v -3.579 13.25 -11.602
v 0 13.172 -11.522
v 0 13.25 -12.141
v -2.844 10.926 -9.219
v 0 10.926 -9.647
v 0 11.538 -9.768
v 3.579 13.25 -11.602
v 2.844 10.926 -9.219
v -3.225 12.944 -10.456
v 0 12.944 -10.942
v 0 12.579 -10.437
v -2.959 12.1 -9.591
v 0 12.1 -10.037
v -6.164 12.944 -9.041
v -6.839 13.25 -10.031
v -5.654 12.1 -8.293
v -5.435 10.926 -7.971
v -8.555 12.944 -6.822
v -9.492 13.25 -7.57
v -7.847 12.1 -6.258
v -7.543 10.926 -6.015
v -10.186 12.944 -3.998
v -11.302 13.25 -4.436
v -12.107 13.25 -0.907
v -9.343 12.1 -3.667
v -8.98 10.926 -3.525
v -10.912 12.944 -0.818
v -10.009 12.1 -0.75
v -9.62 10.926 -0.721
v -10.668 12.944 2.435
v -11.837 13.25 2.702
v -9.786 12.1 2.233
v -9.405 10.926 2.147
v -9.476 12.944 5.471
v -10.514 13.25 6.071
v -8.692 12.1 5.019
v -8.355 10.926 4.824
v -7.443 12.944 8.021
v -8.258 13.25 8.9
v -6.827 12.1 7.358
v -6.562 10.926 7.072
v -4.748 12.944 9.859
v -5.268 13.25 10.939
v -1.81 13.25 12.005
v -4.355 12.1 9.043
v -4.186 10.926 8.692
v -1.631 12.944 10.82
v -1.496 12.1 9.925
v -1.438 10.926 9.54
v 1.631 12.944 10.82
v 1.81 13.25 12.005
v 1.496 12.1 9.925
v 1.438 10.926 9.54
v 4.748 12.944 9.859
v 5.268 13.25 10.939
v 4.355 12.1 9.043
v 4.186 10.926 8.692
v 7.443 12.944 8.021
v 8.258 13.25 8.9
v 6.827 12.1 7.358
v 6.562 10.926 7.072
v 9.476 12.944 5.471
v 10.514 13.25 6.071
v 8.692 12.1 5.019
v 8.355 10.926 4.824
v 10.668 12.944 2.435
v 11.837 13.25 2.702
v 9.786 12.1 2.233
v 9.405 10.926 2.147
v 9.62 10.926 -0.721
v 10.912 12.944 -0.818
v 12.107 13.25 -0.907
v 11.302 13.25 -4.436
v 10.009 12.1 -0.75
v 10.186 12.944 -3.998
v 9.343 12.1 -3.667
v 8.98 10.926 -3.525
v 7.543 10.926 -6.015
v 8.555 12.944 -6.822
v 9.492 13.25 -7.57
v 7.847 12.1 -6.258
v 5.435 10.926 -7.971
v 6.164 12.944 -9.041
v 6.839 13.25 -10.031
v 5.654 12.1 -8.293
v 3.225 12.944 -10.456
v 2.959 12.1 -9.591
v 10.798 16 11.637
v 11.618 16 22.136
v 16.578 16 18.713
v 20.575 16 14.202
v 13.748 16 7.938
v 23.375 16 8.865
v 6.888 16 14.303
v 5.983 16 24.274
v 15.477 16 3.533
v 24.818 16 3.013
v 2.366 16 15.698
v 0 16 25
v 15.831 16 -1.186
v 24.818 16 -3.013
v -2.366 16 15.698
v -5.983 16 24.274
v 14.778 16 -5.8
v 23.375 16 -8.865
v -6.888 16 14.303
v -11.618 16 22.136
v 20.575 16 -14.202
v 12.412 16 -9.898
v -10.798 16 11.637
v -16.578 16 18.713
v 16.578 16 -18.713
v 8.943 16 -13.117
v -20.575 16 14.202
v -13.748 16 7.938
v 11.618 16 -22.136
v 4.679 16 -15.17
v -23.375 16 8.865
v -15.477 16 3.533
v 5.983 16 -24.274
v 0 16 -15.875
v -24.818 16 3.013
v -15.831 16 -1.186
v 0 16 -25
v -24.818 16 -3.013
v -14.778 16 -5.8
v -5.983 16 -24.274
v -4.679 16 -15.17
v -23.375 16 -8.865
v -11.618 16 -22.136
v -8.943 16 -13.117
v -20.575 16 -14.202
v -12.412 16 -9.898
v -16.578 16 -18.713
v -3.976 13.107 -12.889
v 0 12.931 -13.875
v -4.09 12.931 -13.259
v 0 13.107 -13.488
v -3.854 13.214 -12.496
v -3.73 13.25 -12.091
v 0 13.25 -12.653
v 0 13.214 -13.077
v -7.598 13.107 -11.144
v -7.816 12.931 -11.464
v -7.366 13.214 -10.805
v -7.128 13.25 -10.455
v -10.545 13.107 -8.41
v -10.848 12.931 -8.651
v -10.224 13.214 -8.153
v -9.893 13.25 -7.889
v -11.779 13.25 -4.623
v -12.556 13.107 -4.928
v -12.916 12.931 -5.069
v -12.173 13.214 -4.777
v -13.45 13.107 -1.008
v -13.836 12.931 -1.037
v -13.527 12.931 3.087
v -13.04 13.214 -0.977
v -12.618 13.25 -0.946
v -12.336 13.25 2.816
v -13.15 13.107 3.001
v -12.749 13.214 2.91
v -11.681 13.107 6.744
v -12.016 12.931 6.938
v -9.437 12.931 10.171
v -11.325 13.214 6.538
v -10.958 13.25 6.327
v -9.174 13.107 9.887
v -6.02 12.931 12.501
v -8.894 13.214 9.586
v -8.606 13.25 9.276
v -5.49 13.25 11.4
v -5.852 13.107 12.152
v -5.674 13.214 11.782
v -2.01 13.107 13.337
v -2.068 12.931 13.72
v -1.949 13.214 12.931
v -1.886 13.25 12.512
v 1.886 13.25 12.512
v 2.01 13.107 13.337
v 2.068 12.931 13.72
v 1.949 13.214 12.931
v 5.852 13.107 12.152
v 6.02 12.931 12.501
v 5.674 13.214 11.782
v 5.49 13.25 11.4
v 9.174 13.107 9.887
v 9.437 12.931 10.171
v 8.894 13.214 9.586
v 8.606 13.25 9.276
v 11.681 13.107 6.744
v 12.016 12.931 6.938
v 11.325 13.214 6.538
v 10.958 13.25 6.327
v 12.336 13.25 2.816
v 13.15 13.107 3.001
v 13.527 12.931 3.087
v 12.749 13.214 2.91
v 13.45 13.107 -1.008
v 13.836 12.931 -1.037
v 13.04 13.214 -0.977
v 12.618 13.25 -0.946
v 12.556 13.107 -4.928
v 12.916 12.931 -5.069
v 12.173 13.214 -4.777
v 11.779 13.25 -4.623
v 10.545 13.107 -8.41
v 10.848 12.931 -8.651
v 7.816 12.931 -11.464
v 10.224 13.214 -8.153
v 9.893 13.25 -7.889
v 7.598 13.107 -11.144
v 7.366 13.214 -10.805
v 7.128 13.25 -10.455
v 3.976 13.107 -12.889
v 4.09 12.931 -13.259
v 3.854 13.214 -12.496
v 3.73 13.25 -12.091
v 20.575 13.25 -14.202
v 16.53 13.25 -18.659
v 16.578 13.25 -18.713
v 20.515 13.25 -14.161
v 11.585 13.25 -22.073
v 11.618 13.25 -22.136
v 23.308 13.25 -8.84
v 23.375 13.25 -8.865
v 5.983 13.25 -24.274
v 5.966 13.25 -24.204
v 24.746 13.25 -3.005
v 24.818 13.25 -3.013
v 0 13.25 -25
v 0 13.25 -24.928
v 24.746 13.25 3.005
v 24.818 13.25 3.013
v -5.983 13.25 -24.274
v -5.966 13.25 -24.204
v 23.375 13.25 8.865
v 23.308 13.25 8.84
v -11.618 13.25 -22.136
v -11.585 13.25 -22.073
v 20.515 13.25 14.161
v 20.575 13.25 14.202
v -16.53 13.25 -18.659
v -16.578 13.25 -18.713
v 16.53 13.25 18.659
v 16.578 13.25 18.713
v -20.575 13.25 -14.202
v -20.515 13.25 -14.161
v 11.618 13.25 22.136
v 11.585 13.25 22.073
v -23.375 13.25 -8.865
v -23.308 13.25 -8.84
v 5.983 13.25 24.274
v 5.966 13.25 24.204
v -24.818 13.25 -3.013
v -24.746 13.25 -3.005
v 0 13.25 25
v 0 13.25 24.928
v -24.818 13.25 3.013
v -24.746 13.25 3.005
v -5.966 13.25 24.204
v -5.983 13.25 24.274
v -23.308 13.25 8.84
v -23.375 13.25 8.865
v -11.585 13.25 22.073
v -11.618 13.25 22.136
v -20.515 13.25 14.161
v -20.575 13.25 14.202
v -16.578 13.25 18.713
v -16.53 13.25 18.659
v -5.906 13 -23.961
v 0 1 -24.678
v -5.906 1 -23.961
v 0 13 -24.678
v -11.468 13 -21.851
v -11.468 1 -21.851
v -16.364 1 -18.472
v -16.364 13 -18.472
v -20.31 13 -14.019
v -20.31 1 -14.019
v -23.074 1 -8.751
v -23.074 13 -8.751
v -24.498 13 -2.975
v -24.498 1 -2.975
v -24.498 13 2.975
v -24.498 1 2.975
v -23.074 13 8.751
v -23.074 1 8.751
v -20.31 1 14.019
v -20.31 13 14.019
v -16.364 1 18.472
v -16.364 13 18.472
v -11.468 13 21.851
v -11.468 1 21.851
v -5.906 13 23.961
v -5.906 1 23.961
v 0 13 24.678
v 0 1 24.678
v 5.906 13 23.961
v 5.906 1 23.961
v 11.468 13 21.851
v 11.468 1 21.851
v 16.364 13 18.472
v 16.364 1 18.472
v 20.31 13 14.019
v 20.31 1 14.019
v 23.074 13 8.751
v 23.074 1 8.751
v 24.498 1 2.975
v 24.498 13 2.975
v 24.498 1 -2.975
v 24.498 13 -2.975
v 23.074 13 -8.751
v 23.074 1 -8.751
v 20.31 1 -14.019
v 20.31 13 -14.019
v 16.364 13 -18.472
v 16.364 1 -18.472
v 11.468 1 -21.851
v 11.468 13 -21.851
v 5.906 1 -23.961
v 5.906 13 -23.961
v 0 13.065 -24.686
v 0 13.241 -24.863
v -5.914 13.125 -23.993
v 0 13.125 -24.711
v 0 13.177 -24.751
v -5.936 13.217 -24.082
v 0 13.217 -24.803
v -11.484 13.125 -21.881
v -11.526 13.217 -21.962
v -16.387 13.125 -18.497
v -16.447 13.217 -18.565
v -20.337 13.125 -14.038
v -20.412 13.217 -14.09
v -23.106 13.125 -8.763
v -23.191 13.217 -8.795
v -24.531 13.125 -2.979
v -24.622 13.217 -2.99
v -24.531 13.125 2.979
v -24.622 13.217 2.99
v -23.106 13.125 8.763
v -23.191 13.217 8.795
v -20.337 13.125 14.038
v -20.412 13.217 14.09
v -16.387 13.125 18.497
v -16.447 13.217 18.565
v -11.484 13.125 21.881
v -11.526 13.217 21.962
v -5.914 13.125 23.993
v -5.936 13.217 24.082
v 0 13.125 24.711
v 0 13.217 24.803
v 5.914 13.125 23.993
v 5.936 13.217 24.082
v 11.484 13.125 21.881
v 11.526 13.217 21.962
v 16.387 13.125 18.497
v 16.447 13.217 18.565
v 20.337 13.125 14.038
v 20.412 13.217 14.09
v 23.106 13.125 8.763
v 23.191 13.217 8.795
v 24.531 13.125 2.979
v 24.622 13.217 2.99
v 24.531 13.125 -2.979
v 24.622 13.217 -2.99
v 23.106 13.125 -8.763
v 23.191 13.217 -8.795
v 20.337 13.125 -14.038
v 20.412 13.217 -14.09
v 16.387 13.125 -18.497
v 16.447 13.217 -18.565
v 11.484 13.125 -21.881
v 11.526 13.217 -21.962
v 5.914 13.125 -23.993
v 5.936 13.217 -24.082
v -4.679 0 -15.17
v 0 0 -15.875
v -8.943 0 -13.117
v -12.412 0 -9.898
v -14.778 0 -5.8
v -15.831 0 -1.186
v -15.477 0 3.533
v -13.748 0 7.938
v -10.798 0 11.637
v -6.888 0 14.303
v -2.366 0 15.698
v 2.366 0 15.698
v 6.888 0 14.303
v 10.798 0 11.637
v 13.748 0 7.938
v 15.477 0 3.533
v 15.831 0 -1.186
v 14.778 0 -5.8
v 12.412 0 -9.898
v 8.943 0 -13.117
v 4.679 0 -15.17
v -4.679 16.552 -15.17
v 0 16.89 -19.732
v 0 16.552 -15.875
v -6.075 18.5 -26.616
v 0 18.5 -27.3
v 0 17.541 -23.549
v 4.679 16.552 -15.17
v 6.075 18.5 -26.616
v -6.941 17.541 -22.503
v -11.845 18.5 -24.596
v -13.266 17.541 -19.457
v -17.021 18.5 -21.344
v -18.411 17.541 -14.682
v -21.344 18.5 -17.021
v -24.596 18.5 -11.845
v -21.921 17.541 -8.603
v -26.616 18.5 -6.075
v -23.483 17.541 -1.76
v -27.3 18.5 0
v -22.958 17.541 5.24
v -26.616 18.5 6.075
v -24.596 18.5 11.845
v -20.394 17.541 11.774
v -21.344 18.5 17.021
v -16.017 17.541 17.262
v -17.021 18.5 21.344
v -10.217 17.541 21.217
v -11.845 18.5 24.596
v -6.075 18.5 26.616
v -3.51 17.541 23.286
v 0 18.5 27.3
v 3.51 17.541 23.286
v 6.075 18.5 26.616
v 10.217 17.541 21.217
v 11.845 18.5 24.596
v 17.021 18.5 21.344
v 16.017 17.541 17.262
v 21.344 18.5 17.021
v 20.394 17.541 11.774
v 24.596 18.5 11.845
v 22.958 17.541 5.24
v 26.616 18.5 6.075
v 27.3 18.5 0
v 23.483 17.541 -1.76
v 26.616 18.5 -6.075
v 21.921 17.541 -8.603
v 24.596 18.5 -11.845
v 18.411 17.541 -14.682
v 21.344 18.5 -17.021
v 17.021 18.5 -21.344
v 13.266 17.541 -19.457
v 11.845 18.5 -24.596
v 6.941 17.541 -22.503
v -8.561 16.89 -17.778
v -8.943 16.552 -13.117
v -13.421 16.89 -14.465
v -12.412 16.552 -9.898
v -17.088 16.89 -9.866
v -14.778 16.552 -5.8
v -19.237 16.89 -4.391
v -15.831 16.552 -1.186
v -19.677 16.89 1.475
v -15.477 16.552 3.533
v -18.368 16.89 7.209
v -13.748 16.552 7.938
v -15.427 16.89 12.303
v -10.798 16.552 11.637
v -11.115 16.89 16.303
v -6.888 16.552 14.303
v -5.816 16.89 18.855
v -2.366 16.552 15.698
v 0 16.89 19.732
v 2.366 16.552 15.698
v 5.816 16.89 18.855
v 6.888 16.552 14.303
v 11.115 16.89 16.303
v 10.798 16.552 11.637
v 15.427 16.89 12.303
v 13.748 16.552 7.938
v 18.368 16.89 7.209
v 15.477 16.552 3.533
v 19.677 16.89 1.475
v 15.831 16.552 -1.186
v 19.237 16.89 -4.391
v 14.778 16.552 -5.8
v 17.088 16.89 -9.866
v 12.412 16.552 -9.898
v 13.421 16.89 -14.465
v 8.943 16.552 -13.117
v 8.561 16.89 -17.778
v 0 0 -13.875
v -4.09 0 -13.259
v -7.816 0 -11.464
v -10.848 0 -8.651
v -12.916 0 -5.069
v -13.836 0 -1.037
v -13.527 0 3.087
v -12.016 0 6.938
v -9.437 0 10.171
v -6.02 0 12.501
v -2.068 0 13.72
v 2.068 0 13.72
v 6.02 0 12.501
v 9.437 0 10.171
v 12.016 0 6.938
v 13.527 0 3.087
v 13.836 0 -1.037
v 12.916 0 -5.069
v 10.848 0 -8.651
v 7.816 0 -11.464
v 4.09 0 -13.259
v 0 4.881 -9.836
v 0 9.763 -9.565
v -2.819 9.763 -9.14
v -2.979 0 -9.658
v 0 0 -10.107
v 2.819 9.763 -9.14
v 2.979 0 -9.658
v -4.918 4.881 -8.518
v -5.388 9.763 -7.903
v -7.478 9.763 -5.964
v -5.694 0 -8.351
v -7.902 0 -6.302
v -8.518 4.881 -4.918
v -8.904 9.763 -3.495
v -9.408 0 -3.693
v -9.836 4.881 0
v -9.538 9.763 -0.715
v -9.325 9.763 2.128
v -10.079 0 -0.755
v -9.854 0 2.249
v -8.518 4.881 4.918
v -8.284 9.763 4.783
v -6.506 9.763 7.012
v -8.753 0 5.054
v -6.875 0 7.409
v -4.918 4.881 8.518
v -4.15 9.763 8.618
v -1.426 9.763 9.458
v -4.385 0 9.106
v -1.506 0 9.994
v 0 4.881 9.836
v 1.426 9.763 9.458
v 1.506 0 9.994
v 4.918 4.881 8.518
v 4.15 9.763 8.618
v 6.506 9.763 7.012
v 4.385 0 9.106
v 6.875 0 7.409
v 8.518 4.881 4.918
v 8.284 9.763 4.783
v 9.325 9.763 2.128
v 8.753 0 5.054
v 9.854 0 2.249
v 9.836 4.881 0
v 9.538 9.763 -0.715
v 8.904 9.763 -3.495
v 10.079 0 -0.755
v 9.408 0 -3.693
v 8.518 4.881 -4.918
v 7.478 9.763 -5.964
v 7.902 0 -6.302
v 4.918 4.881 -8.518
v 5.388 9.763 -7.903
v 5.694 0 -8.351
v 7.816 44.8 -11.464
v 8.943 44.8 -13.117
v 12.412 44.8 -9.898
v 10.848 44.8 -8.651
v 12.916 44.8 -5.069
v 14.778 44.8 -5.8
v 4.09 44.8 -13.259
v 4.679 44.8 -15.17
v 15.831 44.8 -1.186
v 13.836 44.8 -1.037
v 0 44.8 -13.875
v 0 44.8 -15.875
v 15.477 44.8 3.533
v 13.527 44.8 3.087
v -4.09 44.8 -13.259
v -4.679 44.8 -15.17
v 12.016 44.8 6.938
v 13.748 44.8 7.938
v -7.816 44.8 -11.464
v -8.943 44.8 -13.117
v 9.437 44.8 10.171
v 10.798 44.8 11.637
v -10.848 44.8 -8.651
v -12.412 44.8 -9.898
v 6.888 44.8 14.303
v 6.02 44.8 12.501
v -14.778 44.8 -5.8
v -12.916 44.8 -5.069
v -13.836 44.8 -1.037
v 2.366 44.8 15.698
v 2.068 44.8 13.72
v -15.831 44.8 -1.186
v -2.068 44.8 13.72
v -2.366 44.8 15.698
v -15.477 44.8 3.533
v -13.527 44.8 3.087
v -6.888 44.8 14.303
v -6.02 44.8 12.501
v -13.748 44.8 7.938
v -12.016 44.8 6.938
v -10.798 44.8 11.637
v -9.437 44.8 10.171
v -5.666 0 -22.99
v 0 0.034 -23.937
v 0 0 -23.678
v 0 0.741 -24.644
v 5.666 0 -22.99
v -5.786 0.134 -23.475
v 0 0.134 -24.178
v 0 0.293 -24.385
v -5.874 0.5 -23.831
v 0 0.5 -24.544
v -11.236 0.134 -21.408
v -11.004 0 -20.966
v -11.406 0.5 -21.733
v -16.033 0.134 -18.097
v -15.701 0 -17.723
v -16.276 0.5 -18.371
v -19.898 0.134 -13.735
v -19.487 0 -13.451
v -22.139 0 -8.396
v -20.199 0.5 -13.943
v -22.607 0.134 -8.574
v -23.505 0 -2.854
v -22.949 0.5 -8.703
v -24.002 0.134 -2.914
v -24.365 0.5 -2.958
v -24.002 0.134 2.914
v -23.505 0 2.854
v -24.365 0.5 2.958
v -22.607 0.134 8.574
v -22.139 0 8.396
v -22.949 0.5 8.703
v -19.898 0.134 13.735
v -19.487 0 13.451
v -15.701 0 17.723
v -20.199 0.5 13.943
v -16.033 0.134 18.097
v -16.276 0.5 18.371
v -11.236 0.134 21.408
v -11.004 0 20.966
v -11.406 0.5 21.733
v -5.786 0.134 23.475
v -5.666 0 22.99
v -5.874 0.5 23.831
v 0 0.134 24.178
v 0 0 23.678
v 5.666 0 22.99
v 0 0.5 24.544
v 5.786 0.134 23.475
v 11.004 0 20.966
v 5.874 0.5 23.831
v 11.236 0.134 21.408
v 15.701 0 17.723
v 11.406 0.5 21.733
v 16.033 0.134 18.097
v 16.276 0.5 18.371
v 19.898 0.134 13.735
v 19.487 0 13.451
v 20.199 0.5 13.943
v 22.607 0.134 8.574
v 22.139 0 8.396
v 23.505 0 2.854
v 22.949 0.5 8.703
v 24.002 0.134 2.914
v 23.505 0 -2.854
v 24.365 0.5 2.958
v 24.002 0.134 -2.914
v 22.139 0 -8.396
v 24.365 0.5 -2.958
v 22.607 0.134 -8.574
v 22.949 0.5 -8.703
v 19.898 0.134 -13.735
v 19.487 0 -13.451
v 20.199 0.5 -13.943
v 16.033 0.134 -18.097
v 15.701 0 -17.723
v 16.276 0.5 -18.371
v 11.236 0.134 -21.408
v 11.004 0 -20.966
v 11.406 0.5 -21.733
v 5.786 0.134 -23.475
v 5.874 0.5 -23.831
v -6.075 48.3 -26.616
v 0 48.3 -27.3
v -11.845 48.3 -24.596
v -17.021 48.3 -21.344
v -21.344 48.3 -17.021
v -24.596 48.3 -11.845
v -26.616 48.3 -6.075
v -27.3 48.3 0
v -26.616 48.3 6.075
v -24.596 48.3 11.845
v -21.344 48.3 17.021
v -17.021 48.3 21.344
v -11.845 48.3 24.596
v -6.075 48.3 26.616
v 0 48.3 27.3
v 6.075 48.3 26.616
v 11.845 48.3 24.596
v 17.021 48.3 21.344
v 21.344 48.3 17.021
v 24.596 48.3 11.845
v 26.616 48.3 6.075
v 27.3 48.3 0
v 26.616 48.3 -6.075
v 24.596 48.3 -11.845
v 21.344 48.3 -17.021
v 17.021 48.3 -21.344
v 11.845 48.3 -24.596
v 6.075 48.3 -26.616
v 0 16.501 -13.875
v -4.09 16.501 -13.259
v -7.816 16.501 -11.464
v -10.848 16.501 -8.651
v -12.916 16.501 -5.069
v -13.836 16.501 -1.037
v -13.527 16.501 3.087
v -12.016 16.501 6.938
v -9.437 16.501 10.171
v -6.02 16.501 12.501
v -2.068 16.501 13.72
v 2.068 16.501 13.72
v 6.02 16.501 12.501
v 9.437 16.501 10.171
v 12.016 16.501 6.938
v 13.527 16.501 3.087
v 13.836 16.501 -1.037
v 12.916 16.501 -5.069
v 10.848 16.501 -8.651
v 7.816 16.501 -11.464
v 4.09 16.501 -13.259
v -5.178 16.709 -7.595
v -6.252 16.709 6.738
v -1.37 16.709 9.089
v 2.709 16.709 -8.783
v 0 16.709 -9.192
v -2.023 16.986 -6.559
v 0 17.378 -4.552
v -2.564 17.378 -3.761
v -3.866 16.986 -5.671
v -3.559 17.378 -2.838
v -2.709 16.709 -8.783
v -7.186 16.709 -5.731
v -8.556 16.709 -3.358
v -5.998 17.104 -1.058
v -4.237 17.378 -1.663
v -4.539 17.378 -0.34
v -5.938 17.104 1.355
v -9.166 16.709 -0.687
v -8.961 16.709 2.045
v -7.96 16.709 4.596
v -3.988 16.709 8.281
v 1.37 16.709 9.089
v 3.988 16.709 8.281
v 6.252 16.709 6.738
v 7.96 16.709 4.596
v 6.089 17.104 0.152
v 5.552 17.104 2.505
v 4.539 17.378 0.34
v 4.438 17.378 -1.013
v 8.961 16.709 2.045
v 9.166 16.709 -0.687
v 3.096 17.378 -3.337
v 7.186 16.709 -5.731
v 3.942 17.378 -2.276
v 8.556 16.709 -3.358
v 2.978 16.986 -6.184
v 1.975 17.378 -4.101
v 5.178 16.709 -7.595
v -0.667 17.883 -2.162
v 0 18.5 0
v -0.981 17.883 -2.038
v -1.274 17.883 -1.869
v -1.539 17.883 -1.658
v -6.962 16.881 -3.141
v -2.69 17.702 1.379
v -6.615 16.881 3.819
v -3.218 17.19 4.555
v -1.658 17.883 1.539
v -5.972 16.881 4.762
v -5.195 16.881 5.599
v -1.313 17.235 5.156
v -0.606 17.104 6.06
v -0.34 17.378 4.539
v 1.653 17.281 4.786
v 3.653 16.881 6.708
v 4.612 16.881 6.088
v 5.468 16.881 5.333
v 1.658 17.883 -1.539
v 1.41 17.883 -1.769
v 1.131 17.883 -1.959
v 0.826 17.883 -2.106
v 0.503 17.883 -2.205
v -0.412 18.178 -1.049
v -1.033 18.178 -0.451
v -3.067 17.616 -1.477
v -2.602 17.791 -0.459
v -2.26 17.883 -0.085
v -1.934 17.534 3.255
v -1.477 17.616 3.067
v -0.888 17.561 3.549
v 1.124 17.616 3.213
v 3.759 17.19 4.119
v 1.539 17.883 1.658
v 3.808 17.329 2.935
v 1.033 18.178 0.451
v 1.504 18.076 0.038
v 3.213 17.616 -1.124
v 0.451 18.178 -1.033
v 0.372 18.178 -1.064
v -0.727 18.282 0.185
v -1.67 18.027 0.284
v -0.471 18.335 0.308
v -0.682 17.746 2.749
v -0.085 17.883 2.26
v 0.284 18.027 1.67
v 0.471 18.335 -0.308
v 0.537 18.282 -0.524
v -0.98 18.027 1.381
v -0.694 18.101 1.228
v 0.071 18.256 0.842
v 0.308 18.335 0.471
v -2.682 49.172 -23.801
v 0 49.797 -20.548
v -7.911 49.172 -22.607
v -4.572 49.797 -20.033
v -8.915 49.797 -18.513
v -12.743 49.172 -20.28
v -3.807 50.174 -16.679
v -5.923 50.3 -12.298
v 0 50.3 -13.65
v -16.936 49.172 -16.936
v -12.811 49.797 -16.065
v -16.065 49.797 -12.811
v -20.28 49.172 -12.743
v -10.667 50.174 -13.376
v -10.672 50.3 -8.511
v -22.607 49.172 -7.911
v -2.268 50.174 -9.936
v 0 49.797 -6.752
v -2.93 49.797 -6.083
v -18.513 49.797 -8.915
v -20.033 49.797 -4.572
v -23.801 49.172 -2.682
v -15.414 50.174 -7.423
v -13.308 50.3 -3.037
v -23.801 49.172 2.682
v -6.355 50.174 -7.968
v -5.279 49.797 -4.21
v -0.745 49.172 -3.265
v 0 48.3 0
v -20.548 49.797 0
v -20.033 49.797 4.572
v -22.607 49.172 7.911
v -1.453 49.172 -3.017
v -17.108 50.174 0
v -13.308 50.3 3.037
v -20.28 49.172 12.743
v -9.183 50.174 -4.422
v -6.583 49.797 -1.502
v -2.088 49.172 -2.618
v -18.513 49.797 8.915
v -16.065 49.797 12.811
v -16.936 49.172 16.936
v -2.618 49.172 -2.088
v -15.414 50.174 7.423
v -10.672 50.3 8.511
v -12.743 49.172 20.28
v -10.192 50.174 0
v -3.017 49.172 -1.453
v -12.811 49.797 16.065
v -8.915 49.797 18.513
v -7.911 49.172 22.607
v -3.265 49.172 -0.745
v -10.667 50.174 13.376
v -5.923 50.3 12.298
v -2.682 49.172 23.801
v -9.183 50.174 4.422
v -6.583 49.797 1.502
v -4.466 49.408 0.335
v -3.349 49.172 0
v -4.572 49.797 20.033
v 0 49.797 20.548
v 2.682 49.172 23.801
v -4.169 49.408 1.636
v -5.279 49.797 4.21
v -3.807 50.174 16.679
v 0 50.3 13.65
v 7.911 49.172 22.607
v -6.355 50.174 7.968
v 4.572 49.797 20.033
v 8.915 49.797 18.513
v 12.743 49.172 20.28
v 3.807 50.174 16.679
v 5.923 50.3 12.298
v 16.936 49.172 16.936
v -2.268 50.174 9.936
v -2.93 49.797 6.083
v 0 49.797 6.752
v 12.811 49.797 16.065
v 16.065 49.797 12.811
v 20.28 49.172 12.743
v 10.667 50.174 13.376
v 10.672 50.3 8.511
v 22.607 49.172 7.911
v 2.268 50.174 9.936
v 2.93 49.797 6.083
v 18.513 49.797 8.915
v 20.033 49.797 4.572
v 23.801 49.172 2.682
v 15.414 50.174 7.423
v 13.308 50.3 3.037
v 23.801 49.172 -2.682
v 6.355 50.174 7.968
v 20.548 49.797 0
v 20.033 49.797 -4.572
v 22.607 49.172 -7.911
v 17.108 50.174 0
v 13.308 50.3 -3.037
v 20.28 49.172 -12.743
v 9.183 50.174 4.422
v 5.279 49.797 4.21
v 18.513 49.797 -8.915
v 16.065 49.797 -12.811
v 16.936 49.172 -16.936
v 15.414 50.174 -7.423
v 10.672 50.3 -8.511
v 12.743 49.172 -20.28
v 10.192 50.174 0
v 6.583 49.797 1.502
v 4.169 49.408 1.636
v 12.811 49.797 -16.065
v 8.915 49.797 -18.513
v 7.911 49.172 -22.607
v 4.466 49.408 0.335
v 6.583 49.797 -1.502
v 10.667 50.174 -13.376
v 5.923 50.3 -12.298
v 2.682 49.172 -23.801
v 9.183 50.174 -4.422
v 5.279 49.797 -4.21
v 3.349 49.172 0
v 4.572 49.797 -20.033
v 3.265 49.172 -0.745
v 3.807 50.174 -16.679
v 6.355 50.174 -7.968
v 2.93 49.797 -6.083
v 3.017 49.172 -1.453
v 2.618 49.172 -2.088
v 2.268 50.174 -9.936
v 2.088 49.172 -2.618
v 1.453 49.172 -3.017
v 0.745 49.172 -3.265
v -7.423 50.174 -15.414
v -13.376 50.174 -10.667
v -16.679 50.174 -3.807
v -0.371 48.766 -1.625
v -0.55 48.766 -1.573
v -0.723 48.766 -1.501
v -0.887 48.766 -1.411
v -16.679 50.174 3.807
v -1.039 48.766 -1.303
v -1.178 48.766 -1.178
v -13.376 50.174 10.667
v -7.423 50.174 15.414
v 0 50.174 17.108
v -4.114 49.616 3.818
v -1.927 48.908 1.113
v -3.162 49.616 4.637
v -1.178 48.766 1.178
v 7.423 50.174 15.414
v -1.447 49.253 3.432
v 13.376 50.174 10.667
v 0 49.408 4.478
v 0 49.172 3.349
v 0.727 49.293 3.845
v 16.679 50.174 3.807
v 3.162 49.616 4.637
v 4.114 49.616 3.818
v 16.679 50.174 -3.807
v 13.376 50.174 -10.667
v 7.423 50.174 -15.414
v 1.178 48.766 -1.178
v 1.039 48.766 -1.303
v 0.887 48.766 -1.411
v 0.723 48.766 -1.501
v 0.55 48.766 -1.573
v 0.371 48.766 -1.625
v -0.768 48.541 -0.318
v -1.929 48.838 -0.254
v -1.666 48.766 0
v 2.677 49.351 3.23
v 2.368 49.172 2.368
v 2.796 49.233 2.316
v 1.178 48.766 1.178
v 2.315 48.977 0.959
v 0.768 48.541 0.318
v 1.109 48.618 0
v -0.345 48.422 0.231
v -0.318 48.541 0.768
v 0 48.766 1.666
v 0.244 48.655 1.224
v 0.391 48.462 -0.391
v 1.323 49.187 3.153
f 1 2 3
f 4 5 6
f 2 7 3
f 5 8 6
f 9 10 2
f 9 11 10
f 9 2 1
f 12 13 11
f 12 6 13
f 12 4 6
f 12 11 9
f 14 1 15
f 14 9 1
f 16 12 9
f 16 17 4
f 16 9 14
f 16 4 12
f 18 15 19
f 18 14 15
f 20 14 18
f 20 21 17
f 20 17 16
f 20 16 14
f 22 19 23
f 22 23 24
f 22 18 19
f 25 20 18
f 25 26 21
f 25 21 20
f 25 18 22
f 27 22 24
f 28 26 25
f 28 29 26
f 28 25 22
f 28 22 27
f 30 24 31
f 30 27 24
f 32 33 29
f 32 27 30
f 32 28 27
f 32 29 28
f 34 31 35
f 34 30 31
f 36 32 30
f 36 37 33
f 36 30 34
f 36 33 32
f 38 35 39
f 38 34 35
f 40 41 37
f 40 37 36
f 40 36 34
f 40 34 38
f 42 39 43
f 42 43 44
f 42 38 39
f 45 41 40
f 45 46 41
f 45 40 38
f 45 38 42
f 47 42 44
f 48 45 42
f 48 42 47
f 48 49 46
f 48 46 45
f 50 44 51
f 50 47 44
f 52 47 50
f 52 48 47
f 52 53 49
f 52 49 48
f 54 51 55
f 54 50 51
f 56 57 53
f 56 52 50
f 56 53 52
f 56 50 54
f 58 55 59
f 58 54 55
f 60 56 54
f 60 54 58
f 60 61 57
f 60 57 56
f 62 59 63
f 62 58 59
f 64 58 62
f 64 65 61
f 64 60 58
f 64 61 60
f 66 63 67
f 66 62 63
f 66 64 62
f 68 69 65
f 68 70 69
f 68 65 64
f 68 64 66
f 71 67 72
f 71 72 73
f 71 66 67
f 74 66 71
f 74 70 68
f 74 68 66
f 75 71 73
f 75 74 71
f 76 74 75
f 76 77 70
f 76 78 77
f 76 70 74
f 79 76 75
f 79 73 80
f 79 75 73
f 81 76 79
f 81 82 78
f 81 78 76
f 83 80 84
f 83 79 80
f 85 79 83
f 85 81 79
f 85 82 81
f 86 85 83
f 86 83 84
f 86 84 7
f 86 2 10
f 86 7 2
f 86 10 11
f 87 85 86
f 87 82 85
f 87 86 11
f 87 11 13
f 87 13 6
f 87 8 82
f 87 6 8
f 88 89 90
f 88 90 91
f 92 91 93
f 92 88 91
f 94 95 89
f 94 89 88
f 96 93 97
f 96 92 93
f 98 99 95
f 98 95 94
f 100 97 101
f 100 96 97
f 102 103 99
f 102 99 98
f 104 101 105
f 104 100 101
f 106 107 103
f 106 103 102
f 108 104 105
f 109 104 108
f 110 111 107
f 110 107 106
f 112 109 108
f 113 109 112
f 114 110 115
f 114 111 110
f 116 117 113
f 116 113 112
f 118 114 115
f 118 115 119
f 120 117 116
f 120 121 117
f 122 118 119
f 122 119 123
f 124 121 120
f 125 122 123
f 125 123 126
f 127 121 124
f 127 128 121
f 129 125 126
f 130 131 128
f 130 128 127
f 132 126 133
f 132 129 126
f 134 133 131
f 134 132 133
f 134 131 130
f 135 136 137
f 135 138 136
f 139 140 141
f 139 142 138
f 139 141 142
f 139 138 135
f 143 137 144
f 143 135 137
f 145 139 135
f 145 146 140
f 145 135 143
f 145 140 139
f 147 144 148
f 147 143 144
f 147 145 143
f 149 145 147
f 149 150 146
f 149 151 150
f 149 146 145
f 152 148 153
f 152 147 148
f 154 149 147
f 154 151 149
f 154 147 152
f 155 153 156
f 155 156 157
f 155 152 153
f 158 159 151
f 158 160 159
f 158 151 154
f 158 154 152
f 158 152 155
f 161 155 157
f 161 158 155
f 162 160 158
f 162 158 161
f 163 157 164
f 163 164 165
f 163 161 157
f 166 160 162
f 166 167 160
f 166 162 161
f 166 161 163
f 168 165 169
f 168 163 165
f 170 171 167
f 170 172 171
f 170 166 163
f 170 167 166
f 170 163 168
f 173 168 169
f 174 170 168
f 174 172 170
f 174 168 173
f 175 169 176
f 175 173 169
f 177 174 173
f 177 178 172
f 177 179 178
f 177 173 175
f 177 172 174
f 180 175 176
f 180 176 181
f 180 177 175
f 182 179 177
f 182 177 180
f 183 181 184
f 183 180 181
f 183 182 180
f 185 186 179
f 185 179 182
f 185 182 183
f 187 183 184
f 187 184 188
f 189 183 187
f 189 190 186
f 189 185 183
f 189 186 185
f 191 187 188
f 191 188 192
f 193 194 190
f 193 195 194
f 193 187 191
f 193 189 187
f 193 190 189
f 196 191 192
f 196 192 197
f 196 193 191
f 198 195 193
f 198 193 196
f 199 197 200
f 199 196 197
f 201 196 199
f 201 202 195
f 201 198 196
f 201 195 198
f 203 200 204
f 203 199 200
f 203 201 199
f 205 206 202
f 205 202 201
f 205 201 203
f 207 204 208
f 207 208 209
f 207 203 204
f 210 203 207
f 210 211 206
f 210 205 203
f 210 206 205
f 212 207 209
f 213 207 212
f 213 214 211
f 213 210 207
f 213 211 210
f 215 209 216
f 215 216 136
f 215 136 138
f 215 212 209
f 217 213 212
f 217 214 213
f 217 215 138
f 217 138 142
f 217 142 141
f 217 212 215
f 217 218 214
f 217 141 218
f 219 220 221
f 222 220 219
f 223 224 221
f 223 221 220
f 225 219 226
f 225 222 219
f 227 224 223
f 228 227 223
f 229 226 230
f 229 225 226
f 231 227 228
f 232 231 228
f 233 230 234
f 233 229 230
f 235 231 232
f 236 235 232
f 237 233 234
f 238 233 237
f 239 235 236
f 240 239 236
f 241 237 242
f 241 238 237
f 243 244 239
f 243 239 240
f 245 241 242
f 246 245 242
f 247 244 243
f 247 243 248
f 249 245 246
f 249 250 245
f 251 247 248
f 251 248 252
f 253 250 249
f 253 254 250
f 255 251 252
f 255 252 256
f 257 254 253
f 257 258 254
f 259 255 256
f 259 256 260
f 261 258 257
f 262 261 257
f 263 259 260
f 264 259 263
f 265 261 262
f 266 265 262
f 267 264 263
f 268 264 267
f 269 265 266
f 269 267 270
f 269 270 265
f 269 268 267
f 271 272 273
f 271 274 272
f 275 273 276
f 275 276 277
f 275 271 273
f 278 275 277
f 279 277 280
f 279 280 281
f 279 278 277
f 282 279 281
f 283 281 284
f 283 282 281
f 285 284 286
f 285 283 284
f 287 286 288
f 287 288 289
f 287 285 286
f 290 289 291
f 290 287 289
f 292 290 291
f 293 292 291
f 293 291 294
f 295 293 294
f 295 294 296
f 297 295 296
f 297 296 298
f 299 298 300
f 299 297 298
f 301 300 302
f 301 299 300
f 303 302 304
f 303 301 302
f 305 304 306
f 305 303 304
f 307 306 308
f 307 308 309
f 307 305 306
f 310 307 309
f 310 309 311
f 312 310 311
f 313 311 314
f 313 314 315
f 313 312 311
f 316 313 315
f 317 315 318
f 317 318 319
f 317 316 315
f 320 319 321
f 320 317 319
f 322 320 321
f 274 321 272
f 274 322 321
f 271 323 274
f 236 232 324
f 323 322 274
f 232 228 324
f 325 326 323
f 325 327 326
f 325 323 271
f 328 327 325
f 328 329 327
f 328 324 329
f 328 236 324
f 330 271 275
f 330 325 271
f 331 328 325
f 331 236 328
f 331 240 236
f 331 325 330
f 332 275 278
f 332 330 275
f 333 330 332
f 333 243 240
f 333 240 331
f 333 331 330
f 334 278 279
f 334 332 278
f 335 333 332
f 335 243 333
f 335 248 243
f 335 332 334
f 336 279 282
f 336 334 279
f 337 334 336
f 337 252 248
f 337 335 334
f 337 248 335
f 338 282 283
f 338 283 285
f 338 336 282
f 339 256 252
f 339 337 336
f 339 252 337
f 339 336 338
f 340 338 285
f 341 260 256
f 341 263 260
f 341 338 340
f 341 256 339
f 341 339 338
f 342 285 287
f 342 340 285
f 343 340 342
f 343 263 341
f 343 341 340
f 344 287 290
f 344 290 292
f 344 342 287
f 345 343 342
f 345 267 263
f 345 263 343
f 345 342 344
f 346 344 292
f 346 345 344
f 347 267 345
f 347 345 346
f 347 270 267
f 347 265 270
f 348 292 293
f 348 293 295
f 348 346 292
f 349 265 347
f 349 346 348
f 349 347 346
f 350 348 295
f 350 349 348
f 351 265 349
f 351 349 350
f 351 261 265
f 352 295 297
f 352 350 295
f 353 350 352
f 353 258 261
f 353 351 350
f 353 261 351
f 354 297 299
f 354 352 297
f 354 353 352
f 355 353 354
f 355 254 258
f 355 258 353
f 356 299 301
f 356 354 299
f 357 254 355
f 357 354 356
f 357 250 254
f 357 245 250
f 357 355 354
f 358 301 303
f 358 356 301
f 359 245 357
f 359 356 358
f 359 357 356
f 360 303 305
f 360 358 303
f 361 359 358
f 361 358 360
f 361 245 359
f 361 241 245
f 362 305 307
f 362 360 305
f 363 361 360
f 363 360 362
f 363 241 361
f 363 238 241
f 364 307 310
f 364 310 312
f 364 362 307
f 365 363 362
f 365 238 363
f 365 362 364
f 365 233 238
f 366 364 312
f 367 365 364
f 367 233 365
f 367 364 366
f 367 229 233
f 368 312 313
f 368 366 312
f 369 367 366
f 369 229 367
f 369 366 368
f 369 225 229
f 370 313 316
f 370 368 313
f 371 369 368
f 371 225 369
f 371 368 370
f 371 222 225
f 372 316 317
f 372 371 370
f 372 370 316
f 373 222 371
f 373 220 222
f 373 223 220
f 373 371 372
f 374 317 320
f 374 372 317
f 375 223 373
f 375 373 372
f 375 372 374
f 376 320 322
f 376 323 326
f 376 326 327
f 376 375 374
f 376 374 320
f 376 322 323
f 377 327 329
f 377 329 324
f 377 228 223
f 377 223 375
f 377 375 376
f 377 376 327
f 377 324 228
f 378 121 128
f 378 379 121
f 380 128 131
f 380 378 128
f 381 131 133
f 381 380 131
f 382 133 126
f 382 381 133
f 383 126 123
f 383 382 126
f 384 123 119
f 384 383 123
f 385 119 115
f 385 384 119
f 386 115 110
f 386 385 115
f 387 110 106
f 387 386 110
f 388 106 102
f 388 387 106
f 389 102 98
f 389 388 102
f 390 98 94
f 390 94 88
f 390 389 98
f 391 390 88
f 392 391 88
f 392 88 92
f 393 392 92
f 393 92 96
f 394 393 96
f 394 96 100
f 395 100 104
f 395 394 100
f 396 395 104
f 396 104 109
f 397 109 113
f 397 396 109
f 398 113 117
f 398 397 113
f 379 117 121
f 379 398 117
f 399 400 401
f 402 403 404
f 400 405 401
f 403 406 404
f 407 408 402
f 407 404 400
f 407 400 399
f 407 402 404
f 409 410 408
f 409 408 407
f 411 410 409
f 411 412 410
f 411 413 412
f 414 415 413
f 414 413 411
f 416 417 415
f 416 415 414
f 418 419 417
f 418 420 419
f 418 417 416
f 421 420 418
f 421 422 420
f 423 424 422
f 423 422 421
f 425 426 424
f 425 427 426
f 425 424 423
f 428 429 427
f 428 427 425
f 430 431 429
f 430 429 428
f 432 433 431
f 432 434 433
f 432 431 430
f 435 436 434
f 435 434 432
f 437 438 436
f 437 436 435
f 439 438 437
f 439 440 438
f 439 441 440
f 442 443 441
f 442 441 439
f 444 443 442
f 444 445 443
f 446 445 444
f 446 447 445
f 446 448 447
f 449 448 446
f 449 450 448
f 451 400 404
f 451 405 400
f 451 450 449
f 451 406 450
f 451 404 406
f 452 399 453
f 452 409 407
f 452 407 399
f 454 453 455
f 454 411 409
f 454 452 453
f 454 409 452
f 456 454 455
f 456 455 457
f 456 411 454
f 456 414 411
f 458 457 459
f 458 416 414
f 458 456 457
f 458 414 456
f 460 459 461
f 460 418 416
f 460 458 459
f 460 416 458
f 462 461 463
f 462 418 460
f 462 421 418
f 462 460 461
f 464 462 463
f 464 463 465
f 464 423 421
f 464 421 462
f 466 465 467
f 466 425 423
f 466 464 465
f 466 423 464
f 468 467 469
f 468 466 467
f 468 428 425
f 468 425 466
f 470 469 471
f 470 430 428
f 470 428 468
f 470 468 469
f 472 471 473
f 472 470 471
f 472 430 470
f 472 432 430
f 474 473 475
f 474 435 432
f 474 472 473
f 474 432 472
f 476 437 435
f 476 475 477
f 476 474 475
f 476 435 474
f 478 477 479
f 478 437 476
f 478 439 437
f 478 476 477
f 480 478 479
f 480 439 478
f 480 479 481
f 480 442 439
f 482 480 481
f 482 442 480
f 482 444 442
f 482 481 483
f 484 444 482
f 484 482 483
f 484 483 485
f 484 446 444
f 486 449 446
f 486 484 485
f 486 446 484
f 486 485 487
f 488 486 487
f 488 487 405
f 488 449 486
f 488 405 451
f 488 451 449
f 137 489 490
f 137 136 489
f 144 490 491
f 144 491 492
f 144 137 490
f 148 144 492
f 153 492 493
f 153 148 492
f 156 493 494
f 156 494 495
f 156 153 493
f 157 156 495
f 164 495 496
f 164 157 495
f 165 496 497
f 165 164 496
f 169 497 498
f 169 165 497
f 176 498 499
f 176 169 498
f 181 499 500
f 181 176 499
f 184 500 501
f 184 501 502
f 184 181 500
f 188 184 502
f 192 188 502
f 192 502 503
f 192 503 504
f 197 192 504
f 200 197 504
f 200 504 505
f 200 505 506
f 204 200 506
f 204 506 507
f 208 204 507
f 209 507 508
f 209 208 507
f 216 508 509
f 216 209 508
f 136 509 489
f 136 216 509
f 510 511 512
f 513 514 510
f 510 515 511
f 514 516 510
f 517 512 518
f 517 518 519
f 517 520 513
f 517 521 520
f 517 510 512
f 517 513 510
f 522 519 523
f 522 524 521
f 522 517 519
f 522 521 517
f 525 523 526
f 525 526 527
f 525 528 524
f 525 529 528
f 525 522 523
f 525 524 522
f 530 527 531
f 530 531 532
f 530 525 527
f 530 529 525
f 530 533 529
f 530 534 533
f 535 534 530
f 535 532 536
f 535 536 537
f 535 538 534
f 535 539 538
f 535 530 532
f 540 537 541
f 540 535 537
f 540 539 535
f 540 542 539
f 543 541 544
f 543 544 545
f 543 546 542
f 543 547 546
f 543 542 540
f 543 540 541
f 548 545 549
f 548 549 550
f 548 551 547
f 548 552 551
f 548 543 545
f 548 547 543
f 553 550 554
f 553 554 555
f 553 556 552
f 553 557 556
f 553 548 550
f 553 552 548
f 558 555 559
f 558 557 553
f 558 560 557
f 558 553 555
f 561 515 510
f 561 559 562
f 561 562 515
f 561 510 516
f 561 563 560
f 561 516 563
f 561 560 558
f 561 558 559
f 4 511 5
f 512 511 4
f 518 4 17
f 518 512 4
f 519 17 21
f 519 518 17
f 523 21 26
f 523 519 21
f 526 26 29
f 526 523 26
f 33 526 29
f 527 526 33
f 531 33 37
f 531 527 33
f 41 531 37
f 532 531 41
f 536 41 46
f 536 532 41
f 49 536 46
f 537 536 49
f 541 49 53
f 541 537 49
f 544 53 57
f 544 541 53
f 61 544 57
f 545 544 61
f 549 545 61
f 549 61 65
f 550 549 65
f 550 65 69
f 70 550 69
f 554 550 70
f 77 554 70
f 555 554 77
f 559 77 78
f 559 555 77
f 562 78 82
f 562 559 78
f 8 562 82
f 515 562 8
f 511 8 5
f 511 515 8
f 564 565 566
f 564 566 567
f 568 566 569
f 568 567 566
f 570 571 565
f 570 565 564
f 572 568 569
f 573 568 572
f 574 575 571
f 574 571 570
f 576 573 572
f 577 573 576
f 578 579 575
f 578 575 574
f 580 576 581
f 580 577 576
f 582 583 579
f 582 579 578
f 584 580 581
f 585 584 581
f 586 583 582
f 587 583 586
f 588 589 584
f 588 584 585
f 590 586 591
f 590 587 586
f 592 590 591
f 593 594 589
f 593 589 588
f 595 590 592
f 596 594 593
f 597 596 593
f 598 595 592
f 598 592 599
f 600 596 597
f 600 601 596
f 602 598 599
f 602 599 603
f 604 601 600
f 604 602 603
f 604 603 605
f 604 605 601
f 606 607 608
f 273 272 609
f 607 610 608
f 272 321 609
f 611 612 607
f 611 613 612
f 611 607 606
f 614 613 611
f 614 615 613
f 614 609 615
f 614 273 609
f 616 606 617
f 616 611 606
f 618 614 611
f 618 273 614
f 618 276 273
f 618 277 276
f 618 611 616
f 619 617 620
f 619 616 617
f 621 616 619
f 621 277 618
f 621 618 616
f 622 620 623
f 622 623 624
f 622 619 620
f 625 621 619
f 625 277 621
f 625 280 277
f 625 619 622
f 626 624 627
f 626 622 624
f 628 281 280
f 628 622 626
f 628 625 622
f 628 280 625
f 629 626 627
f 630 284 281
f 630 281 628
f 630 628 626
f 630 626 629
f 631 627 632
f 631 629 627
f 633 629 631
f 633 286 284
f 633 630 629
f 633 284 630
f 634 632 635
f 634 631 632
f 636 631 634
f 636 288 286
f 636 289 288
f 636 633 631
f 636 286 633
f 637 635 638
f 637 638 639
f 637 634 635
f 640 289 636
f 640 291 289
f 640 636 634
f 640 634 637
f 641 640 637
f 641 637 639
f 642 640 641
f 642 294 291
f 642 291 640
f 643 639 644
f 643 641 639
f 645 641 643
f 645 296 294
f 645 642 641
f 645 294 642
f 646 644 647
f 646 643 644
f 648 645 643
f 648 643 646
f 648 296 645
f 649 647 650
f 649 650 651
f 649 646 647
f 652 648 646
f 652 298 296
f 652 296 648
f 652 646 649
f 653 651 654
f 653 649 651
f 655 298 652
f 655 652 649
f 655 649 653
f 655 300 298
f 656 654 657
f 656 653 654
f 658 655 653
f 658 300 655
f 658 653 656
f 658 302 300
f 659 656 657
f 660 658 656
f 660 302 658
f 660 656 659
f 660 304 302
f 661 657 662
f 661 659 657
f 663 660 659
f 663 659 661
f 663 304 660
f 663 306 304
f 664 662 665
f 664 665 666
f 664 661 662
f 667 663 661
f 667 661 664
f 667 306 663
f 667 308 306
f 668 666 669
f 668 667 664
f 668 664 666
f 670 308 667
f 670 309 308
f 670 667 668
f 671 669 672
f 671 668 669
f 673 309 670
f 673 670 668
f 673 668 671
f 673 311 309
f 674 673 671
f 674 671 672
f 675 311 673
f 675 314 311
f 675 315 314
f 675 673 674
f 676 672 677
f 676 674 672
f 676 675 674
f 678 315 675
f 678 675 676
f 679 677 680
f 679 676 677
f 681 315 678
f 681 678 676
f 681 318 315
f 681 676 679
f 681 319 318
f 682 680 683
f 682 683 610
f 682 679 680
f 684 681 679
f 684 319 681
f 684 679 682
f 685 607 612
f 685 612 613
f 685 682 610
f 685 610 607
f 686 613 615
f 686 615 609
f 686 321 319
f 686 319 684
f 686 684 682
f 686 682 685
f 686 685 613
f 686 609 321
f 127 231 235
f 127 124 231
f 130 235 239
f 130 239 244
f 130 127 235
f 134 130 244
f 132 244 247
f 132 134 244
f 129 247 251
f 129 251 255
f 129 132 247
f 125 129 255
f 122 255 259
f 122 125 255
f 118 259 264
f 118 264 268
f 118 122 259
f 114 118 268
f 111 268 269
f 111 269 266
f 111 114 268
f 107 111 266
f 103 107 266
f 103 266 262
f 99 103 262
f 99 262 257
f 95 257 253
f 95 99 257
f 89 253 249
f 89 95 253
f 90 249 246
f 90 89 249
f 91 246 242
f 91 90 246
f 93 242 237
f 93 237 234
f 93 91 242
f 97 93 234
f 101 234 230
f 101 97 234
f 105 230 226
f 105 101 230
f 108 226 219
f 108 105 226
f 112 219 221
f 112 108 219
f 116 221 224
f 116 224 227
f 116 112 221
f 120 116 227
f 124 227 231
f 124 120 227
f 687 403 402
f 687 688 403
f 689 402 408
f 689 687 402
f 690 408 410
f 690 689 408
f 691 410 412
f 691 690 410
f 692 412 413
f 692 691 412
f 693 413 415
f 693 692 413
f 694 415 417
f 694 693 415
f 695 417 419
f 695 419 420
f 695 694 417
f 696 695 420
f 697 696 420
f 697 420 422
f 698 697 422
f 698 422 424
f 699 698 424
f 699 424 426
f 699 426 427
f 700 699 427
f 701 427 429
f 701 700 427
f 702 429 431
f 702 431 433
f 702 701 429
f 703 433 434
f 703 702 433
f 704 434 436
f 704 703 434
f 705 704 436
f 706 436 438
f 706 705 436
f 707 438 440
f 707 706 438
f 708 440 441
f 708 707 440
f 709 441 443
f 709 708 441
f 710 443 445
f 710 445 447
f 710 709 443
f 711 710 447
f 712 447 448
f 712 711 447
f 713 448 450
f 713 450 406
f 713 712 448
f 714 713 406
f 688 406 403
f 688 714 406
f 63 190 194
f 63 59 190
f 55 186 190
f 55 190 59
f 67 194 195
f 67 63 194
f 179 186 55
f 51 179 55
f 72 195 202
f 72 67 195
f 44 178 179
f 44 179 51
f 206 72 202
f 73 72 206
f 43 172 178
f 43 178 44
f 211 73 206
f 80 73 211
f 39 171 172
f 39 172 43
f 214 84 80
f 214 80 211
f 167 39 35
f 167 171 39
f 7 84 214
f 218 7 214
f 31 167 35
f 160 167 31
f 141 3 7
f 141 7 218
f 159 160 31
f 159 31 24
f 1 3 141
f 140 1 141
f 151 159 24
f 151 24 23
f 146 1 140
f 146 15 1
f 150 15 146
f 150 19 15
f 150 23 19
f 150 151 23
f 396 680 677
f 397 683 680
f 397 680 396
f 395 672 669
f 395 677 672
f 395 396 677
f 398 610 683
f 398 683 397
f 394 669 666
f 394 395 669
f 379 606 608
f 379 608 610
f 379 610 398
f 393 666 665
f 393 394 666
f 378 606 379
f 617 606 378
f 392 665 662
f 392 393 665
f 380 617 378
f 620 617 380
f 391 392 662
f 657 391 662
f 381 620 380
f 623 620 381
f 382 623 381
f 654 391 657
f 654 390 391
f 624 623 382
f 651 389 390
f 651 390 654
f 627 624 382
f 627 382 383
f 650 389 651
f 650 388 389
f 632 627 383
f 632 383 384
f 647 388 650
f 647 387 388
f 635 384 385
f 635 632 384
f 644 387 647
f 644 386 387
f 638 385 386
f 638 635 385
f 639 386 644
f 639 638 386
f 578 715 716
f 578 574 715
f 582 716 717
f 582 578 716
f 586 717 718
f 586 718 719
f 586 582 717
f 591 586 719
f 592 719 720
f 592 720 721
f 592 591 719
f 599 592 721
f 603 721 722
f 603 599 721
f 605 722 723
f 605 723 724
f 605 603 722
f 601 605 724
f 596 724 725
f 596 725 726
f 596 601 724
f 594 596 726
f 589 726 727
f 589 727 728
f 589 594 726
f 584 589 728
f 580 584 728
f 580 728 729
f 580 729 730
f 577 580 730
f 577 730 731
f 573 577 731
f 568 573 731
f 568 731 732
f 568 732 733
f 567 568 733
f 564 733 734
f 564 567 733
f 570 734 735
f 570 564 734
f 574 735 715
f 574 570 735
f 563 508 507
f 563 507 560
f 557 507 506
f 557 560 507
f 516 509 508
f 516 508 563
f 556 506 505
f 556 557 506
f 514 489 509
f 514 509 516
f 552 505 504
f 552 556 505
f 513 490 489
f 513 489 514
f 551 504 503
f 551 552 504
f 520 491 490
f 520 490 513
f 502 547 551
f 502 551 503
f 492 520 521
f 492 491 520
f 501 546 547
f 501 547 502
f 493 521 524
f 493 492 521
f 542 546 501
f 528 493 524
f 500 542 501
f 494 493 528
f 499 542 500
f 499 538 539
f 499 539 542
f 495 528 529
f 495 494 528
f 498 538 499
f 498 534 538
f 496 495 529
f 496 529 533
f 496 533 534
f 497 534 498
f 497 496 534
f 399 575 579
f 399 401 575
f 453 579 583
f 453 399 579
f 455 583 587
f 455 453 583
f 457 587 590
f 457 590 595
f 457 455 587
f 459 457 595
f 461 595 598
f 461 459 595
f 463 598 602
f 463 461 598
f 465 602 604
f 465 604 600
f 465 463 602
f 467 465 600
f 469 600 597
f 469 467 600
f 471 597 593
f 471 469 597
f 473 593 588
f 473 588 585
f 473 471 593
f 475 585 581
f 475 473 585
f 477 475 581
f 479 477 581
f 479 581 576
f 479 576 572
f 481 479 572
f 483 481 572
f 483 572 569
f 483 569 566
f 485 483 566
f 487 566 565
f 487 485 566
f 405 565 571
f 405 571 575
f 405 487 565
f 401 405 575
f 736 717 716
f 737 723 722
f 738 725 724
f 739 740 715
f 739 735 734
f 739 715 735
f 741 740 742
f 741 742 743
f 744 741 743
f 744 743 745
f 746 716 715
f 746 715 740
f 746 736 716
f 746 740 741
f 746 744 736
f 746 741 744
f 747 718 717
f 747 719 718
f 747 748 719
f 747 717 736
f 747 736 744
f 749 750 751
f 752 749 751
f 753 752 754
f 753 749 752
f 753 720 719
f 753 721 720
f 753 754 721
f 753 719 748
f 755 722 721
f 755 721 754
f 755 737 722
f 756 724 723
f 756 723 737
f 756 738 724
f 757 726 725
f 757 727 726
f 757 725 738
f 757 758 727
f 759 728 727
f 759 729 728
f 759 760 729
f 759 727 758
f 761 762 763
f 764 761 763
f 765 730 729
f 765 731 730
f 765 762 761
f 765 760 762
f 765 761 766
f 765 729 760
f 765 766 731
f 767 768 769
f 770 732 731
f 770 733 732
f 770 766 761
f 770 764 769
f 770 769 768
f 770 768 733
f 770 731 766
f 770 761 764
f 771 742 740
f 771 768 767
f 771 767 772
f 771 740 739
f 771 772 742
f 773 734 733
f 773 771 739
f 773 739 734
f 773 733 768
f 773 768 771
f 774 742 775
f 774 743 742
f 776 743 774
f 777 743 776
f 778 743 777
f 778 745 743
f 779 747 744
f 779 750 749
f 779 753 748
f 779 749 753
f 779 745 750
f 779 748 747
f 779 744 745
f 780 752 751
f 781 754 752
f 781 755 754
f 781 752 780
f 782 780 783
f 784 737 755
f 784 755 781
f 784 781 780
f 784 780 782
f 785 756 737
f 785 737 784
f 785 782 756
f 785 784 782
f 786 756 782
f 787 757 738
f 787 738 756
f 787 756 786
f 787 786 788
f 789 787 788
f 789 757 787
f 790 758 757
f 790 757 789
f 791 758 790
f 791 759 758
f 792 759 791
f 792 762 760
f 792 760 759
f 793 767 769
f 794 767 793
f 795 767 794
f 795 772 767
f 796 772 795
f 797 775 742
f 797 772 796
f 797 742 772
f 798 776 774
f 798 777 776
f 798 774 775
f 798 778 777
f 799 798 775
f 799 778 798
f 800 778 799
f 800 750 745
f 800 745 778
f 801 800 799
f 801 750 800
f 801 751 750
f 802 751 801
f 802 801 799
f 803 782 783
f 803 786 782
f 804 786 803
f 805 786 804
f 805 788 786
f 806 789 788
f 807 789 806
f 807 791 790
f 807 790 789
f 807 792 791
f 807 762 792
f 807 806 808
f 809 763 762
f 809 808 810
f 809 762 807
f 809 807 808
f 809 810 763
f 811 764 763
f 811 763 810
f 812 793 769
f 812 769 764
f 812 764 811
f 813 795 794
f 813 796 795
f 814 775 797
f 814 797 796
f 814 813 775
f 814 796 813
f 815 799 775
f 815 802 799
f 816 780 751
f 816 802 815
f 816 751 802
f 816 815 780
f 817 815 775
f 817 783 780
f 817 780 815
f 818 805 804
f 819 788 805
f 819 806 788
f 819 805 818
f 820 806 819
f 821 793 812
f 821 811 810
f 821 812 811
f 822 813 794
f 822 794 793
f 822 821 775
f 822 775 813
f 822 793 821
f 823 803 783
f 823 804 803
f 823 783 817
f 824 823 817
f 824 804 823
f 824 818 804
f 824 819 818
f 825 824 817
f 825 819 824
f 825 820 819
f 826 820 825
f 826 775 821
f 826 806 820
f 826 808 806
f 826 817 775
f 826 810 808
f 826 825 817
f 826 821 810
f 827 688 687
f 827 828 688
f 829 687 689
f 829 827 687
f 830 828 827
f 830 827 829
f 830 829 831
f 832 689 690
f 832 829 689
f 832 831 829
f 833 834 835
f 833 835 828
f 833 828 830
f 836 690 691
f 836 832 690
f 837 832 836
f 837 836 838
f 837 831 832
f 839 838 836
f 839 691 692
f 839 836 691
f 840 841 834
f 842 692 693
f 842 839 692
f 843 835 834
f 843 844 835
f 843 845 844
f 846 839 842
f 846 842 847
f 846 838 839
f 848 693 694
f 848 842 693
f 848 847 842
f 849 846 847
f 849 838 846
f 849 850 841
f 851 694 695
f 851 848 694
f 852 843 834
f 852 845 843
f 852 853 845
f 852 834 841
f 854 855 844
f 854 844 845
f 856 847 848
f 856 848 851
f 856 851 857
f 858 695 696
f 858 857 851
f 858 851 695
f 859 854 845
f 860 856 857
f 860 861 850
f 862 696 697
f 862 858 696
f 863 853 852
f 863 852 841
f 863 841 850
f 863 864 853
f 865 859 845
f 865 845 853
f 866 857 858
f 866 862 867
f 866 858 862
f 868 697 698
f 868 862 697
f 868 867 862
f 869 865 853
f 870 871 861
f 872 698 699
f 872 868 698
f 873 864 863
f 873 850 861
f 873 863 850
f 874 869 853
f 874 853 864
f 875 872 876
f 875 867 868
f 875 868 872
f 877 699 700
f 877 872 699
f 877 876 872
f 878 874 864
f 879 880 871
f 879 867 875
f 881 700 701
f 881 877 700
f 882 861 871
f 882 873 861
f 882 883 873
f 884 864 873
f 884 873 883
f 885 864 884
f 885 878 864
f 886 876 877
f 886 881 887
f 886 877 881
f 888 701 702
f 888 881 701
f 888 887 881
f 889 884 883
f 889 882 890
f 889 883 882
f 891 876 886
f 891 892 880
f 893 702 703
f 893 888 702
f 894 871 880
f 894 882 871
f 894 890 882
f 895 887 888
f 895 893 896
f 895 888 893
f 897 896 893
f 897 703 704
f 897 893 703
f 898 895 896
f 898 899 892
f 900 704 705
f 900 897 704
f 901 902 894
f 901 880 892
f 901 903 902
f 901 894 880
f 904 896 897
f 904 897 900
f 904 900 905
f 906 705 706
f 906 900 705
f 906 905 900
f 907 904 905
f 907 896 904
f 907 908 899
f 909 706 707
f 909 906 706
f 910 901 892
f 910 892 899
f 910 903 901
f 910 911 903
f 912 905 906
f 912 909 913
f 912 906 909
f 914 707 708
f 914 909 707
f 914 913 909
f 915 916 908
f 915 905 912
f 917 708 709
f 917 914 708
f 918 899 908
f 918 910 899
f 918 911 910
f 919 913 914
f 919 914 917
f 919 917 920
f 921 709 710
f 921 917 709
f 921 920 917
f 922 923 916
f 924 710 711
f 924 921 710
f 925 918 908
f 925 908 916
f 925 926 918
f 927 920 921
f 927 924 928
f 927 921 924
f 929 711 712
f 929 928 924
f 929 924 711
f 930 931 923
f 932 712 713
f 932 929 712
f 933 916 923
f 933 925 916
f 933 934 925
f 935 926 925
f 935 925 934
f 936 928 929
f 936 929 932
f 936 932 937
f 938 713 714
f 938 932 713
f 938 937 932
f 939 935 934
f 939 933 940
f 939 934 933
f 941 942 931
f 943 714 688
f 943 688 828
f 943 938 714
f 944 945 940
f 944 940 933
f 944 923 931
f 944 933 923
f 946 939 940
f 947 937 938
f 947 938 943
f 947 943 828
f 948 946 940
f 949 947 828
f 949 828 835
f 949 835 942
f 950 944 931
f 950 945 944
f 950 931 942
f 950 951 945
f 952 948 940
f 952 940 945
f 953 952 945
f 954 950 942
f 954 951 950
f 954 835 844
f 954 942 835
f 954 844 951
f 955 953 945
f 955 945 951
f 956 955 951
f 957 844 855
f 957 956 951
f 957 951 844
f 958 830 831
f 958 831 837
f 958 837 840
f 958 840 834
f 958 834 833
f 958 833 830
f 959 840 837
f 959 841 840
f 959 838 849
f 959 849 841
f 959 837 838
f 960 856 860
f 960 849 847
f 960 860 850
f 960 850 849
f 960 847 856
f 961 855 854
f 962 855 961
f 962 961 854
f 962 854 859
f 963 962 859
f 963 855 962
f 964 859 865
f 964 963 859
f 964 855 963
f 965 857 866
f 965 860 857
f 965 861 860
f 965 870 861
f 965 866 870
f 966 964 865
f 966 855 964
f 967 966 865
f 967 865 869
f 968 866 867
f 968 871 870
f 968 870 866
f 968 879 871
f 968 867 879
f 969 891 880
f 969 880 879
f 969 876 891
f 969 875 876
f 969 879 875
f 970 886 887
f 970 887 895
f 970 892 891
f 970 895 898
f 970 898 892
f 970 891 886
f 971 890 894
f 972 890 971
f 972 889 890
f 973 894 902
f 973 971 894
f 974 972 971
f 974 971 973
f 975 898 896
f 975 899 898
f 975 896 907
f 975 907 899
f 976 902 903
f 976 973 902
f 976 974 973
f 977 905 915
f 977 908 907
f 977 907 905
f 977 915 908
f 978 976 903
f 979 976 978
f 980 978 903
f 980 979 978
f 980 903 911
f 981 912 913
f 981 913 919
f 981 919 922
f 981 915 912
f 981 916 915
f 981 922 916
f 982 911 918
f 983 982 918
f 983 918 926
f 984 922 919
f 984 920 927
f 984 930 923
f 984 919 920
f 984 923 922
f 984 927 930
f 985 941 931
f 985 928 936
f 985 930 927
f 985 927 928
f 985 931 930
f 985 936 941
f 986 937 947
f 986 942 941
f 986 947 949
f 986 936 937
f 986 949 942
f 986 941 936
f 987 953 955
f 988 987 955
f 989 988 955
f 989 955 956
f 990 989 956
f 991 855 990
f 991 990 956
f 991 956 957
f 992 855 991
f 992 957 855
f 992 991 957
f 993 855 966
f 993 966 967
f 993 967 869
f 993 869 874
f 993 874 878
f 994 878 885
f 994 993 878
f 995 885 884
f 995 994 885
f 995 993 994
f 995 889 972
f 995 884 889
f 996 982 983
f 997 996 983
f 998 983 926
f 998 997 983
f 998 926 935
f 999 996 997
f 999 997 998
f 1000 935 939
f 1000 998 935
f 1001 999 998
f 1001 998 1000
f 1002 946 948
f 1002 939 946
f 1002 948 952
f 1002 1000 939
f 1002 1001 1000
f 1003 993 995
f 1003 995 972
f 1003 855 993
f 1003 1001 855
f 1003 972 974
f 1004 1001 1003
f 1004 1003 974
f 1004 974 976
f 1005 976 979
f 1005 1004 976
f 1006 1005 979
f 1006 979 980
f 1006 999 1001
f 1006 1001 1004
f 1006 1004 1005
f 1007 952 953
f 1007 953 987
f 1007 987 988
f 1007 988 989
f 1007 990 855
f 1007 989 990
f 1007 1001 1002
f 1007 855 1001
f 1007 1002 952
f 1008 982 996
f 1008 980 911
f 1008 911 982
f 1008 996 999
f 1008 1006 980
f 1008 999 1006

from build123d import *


# Not quite as in the source:
# - ends of sketch curves that miss each other by under 0.0002 mm in the source are joined


with BuildPart() as f1:
    # F0 (on Right) → F1 (revolve)
    with BuildSketch(Plane.YZ):
        with BuildLine():
            Line((48.3, 0), (44.8, 0))
            Line((44.8, 0), (44.8, -13.875))
            Line((44.8, -13.875), (44.8, -15.875))
            Line((44.8, -15.875), (44.8, -16))
            Line((44.8, -16), (50.2419314905, -16))
            ThreePointArc((50.2419314905, -16), (49.9533733583, -7.9171756979), (48.3, 0))
        make_face()
        with BuildLine():
            Line((44.8, -15.875), (16.5520520108, -15.875))
            ThreePointArc((16.5520520108, -15.875), (17.1768581598, -21.6470326742), (18.5, -27.3))
            Line((18.5, -27.3), (48.3, -27.3))
            ThreePointArc((48.3, -27.3), (49.6125845395, -21.7087079906), (50.2419314905, -16))
            Line((50.2419314905, -16), (44.8, -16))
            Line((44.8, -16), (44.8, -15.875))
        make_face()
        with BuildLine():
            Line((44.8, 0), (18.5, 0))
            ThreePointArc((18.5, 0), (16.9864772631, -6.8634600623), (16.5005319947, -13.875))
            Line((16.5005319947, -13.875), (44.8, -13.875))
            Line((44.8, -13.875), (44.8, 0))
        make_face()
    revolve(axis=Axis((0, 182.171996, 0), (0, 1, 0)))


with BuildPart() as f1b:
    # F0 (on Right) → F1, piece 2 (revolve)
    with BuildSketch(Plane.YZ):
        with BuildLine():
            Line((0, -13.875), (12.9311627863, -13.875))
            ThreePointArc((12.9311627863, -13.875), (13.1689777764, -13.2846144071), (13.25, -12.653309))
            Line((13.25, -12.653309), (13.25, -12.141094))
            ThreePointArc((13.25, -12.141094), (12.5790376496, -10.4367990501), (10.926302979, -9.6473182965))
            Line((10.926302979, -9.6473182965), (9.7628490509, -9.5650652795))
            Line((9.7628490509, -9.5650652795), (0, -10.10706))
            Line((0, -10.10706), (0, -13.875))
        make_face()
    revolve(axis=Axis((0, 182.171996, 0), (0, 1, 0)))


with BuildPart() as f1c:
    # F0 (on Right) → F1, piece 3 (revolve)
    with BuildSketch(Plane.YZ):
        with BuildLine():
            Line((16, -25), (16, -15.875))
            Line((16, -15.875), (0, -15.875))
            Line((0, -15.875), (0, -23.677925))
            ThreePointArc((0, -23.677925), (0.2928932188, -24.3850317812), (1, -24.677925))
            Line((1, -24.677925), (13, -24.677925))
            ThreePointArc((13, -24.677925), (13.1767766953, -24.7511483047), (13.25, -24.927925))
            Line((13.25, -24.927925), (13.25, -25))
            Line((13.25, -25), (16, -25))
        make_face()
    revolve(axis=Axis((0, 182.171996, 0), (0, 1, 0)))


solid = Compound([f1.part, f1b.part, f1c.part])
